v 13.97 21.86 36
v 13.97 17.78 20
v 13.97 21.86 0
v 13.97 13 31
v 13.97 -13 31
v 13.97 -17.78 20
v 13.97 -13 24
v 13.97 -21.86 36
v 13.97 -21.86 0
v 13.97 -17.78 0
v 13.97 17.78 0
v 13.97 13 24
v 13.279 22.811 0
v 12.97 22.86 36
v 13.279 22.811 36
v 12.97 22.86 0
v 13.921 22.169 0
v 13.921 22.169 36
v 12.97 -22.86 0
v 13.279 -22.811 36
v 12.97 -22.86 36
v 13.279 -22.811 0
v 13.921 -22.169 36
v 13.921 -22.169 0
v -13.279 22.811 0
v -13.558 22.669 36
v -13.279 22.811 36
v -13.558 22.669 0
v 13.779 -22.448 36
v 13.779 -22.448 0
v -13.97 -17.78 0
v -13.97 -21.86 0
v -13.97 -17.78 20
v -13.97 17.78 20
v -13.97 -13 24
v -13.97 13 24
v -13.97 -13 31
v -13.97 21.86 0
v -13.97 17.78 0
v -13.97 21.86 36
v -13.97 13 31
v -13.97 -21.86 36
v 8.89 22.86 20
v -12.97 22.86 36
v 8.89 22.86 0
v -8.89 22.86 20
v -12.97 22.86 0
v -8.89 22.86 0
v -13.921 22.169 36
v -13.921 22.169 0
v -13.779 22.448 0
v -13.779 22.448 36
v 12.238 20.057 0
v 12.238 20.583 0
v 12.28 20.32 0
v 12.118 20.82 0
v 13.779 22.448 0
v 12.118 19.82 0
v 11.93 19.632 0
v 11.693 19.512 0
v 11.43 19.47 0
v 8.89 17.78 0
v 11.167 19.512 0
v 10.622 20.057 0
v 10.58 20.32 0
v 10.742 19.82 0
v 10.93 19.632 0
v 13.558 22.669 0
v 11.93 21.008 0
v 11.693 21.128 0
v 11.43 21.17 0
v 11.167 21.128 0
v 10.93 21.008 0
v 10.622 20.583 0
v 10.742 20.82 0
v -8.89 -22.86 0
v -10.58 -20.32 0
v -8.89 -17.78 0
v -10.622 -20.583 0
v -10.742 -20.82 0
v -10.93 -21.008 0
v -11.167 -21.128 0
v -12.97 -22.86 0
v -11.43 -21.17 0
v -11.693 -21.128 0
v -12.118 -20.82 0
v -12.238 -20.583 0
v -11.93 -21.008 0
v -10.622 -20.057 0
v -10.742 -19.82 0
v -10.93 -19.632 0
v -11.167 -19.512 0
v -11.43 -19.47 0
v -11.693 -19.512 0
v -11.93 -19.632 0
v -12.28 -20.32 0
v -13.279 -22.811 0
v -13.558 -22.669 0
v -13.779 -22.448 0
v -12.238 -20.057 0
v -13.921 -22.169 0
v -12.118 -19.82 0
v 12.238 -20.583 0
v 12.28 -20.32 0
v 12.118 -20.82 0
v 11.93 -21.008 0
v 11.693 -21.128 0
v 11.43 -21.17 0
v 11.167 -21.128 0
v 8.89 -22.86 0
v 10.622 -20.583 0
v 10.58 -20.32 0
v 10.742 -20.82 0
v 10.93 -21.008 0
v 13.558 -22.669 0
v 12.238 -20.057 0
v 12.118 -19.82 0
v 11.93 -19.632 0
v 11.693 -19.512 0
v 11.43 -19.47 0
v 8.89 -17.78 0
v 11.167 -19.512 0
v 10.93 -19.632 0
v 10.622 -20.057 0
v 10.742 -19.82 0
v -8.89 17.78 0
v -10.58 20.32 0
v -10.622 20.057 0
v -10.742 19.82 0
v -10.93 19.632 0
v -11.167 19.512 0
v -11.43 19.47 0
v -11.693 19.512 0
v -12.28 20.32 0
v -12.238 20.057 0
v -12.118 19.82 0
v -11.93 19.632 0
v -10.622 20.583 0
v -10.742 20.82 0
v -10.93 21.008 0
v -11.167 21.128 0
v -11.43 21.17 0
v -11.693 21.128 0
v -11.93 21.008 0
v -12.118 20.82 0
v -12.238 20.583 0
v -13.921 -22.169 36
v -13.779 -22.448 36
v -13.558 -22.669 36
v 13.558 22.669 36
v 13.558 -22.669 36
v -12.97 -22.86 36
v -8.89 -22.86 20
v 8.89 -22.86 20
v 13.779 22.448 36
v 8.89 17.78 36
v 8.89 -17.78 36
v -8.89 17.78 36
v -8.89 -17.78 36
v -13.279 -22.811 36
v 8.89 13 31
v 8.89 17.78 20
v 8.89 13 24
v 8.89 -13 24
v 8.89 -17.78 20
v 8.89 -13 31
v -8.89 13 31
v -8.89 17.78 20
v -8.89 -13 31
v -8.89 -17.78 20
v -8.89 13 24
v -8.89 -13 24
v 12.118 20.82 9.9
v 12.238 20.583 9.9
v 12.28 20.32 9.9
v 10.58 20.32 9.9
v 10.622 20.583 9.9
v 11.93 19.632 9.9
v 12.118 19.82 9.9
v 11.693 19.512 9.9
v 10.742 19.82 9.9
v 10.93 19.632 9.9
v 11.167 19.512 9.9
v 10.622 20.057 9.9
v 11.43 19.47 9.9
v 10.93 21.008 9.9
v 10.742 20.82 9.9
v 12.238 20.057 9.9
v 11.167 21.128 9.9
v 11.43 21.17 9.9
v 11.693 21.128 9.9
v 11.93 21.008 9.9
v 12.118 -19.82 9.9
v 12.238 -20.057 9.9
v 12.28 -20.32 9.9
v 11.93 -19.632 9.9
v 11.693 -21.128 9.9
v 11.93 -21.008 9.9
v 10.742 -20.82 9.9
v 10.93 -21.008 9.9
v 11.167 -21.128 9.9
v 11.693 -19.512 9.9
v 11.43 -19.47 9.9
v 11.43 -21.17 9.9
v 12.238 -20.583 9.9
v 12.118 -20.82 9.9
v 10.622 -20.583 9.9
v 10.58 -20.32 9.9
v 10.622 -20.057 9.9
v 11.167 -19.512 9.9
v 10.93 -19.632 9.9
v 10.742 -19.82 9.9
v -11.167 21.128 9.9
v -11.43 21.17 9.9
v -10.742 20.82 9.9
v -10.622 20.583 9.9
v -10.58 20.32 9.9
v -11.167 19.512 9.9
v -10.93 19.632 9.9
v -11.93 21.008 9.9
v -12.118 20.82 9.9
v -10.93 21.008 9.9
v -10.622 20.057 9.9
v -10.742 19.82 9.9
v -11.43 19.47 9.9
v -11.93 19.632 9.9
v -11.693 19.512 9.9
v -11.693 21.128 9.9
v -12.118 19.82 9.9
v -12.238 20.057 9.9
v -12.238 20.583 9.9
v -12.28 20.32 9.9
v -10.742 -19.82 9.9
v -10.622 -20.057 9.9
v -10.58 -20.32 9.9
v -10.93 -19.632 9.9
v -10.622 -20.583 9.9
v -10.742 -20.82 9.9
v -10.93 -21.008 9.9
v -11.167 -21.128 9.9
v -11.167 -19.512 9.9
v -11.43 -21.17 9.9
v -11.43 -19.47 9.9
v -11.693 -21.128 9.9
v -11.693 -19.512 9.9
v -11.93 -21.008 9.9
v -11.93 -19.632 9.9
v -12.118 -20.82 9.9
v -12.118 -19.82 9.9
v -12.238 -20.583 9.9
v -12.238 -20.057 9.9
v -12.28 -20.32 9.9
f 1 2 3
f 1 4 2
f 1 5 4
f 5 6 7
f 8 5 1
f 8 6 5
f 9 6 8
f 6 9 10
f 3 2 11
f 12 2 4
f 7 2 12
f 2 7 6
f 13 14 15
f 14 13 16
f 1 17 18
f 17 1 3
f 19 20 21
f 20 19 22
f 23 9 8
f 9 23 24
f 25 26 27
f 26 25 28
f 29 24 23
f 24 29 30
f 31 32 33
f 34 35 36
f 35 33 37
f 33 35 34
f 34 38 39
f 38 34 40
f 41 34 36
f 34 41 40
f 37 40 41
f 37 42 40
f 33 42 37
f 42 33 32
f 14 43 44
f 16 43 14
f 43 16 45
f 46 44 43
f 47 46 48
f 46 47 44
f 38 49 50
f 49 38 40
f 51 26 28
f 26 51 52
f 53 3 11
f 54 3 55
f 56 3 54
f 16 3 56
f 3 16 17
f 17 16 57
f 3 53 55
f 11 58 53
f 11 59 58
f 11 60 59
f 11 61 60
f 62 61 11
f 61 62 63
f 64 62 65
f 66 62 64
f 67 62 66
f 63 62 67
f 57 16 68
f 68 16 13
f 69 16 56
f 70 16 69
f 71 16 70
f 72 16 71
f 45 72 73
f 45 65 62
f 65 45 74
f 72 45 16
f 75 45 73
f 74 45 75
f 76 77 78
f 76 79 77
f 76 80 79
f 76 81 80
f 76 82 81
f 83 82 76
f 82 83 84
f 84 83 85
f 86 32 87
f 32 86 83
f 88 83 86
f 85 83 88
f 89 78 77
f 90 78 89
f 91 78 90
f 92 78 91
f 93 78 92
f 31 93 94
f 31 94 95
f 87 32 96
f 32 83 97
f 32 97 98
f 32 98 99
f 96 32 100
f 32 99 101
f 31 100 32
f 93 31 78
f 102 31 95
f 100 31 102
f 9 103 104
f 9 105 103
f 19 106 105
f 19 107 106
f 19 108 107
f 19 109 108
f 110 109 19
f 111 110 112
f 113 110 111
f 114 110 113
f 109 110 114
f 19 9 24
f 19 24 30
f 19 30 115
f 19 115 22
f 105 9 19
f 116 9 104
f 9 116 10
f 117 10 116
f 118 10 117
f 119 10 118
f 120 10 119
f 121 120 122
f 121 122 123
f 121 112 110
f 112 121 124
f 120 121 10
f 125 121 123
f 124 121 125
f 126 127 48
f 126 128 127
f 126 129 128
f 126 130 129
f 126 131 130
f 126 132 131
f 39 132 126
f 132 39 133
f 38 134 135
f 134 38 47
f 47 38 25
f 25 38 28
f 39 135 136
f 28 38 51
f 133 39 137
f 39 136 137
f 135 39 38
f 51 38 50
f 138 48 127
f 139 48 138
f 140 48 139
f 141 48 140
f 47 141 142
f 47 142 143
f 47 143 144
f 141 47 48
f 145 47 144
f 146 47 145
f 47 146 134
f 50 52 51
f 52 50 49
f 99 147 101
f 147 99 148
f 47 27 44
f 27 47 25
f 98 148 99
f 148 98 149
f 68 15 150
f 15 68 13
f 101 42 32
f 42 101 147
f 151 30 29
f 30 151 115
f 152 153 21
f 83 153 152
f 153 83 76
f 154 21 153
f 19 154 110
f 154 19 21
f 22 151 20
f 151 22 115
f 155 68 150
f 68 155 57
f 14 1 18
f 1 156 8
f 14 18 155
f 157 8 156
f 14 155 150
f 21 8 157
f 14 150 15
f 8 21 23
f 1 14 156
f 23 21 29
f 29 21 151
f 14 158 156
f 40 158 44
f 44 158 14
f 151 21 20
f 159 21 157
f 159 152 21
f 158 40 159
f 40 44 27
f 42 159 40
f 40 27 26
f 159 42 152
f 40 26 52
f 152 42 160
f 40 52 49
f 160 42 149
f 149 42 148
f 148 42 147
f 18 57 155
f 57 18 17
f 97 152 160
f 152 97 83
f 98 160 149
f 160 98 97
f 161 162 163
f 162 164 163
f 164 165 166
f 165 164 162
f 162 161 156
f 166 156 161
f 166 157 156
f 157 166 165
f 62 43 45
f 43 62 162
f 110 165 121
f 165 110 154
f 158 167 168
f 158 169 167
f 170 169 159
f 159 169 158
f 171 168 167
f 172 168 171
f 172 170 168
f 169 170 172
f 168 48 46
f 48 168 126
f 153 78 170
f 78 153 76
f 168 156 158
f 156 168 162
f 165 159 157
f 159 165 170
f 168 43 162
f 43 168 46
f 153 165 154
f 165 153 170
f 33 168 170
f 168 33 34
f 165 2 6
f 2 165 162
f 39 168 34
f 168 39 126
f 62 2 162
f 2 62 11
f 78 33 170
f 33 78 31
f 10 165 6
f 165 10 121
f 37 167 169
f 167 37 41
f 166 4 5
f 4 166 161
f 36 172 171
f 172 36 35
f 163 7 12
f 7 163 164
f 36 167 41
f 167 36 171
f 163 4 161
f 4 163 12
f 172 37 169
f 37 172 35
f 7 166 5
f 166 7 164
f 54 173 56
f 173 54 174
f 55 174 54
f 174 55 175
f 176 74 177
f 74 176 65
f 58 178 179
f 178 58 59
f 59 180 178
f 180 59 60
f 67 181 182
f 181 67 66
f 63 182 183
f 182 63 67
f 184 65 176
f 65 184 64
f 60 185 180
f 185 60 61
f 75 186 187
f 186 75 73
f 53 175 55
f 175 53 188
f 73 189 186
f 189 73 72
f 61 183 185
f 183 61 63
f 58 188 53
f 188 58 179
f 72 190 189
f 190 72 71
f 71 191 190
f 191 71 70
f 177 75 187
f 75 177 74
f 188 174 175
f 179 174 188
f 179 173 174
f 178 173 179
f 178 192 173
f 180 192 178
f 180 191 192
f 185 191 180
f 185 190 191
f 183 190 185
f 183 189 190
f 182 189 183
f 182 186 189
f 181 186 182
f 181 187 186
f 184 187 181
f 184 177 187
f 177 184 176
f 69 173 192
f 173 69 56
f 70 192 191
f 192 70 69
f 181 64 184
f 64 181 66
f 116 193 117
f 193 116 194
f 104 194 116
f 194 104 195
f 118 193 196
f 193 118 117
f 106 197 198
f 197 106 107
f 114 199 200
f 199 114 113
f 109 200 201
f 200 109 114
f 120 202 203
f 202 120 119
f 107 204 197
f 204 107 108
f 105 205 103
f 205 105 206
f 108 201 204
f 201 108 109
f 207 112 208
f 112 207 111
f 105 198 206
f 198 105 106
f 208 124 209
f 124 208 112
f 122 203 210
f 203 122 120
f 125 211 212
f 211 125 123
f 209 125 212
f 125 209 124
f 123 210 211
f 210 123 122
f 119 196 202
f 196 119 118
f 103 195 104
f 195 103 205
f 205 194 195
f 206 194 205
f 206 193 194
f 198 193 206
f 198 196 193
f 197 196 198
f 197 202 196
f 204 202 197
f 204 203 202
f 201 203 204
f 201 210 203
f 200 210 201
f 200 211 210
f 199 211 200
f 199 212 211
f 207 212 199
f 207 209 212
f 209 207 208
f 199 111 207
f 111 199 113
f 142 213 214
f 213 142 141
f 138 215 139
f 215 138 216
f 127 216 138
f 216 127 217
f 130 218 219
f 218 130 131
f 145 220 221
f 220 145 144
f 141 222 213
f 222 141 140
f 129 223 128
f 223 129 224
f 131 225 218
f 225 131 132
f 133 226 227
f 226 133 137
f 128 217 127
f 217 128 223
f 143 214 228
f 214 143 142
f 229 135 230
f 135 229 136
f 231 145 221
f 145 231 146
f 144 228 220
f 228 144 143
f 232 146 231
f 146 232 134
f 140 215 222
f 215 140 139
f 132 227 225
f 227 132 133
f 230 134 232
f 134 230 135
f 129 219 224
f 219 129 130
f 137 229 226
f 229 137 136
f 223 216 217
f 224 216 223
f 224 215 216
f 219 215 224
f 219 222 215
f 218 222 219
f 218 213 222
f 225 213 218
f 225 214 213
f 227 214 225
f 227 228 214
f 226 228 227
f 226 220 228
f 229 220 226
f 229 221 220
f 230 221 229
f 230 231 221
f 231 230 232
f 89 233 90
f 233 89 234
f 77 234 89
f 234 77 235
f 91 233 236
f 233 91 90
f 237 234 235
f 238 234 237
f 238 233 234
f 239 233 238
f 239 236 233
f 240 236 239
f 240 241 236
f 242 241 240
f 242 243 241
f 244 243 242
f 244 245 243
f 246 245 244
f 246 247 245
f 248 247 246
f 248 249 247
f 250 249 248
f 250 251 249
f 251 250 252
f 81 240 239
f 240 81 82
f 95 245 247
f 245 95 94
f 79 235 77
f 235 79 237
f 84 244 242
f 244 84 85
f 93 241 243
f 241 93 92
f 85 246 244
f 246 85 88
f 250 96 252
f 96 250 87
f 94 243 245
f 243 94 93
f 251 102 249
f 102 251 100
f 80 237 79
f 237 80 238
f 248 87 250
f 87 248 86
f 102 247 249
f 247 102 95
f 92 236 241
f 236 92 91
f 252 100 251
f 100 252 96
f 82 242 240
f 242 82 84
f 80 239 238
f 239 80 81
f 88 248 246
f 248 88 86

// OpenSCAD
// file: ../shapes.scad
FACES   = 180;
EPSILON = 0.1;
PIN	    = 2.54;


module tube(h=1, inner=0, outer=0, di=0, do=0) {
    rInner = inner > 0 ? inner : di / 2;
    rOuter = outer > 0 ? outer : do / 2;

	if (rInner >= rOuter) echo("ERROR in tube. rOuter must be > rInner.");

	difference() {
		cylinder(h=h, r=rOuter);
		translate([0,0,-EPSILON]) {
			cylinder(h=h + EPSILON*2, r=rInner);
		}
	}
}

module roundedRect(size, r)
{
	H = size[2];
	hull()
	{
		translate([r, r, 0])  cylinder(r=r, h=H);
		translate([size[0] - r, r, 0])  cylinder(r=r, h=H);
		translate([r, size[1] - r, 0])  cylinder(r=r, h=H);
		translate([size[0] - r, size[1] - r, 0])  cylinder(r=r, h=H);
	}
}

module cubePair(x, size)
{
	translate([x, 0, 0])
		cube(size=size);
	mirror([1,0,0]) translate([x, 0, 0])
		cube(size=size);
}

module polygonXY(h, points)
{
    linear_extrude(height = h) {
        polygon(points=points);
    }  
}

module polygonYZ(h, points)
{
    multmatrix(m = [ [0, 0, 1, 0],
    				 [1, 0, 0, 0],
    				 [0, 1, 0, 0],
    				 [0, 0, 0, 1]
       			   ])
    linear_extrude(height = h) {
        polygon(points=points);
    }  	
}

module polygonXZ(h, points)
{
    multmatrix(m = [ [1, 0, 0, 0],
    				 [0, 0, 1, 0],
    				 [0, 1, 0, 0],
    				 [0, 0, 0, 1]
       			   ])
    linear_extrude(height = h) {
        polygon(points=points);
    }  	
}


module zCapsule(dz0, dz1, r, roundedRect=0)
{
	if (roundedRect == 0) {
		hull() {
			translate([0, 0, dz0]) rotate([-90, 0, 0]) cylinder(h=50, r=r);
			translate([0, 0, dz1]) rotate([-90, 0, 0]) cylinder(h=50, r=r);
		}
	}
	else {
		if (dz1 < dz0) {
			t = dz0;
			dz0 = dz1;
			dz1 = t;
		}
		hull() {
			translate([r - roundedRect, 0, dz0 - r + roundedRect]) 
				rotate([-90, 0, 0]) cylinder(h=50, r=roundedRect);
			translate([-r + roundedRect, 0, dz0 - r + roundedRect]) 
				rotate([-90, 0, 0]) cylinder(h=50, r=roundedRect);
			translate([r - roundedRect, 0, dz1 + r - roundedRect]) 
				rotate([-90, 0, 0]) cylinder(h=50, r=roundedRect);
			translate([-r + roundedRect, 0, dz1 + r - roundedRect]) 
				rotate([-90, 0, 0]) cylinder(h=50, r=roundedRect);
		}
	}
}


module xRoofCube(size)
{
	x = size[0];
	y = size[1];
	z = size[2];

	polygonXY(h=z, points=[
		[0, 0],
		[x, 0],
		[x, y + x],		// gets the 45 degree angle for printing
		[0, y]
	]);
}
// main file
use <../shapes.scad>

INCH_TO_MM = 25.4;

PCB_W = 0.7 * INCH_TO_MM;
PCB_L = 1.4 * INCH_TO_MM;

SCAFFOLD_W = 1.1 * INCH_TO_MM;
SCAFFOLD_L = 1.8 * INCH_TO_MM;
SCAFFOLD_MOUNT_W = 0.9 * INCH_TO_MM;
SCAFFOLD_MOUNT_L = 1.6 * INCH_TO_MM;

SCAFFOLD_H = 36.0;
ACCESS_H = 20;

SCAFFOLD_SLOT_Z = 24.0;
SCAFFOLD_SLOT_W = 26.0;
SCAFFOLD_SLOT_H = 7.0;

HOLE_D = 1.7;

difference() {
    translate([-SCAFFOLD_W/2, -SCAFFOLD_L/2, 0]) {
        //cube();
        roundedRect(size=[SCAFFOLD_W, SCAFFOLD_L, SCAFFOLD_H], r=1.0, $fn=20);
    }

    // Cut out access
    translate([-PCB_W/2, -PCB_L/2, -1]) cube(size=[PCB_W, PCB_L, 200]);
    translate([-PCB_W/2, -100, -1]) cube(size=[PCB_W, 200, ACCESS_H+1]);
    translate([-100, -PCB_L/2, -1]) cube(size=[200, PCB_L, ACCESS_H+1]);

    // Cut out holder slot
    translate([-100, -SCAFFOLD_SLOT_W/2, SCAFFOLD_SLOT_Z]) cube(size=[200, SCAFFOLD_SLOT_W, SCAFFOLD_SLOT_H]);

    // Cut out bottom holes to affix to test board
    translate([SCAFFOLD_MOUNT_W/2, SCAFFOLD_MOUNT_L/2, -0.1]) cylinder(d=HOLE_D, h=10, $fn=20);
    translate([SCAFFOLD_MOUNT_W/2, -SCAFFOLD_MOUNT_L/2, -0.1]) cylinder(d=HOLE_D, h=10, $fn=20);
    translate([-SCAFFOLD_MOUNT_W/2, SCAFFOLD_MOUNT_L/2, -0.1]) cylinder(d=HOLE_D, h=10, $fn=20);
    translate([-SCAFFOLD_MOUNT_W/2, -SCAFFOLD_MOUNT_L/2, -0.1]) cylinder(d=HOLE_D, h=10, $fn=20);
}
